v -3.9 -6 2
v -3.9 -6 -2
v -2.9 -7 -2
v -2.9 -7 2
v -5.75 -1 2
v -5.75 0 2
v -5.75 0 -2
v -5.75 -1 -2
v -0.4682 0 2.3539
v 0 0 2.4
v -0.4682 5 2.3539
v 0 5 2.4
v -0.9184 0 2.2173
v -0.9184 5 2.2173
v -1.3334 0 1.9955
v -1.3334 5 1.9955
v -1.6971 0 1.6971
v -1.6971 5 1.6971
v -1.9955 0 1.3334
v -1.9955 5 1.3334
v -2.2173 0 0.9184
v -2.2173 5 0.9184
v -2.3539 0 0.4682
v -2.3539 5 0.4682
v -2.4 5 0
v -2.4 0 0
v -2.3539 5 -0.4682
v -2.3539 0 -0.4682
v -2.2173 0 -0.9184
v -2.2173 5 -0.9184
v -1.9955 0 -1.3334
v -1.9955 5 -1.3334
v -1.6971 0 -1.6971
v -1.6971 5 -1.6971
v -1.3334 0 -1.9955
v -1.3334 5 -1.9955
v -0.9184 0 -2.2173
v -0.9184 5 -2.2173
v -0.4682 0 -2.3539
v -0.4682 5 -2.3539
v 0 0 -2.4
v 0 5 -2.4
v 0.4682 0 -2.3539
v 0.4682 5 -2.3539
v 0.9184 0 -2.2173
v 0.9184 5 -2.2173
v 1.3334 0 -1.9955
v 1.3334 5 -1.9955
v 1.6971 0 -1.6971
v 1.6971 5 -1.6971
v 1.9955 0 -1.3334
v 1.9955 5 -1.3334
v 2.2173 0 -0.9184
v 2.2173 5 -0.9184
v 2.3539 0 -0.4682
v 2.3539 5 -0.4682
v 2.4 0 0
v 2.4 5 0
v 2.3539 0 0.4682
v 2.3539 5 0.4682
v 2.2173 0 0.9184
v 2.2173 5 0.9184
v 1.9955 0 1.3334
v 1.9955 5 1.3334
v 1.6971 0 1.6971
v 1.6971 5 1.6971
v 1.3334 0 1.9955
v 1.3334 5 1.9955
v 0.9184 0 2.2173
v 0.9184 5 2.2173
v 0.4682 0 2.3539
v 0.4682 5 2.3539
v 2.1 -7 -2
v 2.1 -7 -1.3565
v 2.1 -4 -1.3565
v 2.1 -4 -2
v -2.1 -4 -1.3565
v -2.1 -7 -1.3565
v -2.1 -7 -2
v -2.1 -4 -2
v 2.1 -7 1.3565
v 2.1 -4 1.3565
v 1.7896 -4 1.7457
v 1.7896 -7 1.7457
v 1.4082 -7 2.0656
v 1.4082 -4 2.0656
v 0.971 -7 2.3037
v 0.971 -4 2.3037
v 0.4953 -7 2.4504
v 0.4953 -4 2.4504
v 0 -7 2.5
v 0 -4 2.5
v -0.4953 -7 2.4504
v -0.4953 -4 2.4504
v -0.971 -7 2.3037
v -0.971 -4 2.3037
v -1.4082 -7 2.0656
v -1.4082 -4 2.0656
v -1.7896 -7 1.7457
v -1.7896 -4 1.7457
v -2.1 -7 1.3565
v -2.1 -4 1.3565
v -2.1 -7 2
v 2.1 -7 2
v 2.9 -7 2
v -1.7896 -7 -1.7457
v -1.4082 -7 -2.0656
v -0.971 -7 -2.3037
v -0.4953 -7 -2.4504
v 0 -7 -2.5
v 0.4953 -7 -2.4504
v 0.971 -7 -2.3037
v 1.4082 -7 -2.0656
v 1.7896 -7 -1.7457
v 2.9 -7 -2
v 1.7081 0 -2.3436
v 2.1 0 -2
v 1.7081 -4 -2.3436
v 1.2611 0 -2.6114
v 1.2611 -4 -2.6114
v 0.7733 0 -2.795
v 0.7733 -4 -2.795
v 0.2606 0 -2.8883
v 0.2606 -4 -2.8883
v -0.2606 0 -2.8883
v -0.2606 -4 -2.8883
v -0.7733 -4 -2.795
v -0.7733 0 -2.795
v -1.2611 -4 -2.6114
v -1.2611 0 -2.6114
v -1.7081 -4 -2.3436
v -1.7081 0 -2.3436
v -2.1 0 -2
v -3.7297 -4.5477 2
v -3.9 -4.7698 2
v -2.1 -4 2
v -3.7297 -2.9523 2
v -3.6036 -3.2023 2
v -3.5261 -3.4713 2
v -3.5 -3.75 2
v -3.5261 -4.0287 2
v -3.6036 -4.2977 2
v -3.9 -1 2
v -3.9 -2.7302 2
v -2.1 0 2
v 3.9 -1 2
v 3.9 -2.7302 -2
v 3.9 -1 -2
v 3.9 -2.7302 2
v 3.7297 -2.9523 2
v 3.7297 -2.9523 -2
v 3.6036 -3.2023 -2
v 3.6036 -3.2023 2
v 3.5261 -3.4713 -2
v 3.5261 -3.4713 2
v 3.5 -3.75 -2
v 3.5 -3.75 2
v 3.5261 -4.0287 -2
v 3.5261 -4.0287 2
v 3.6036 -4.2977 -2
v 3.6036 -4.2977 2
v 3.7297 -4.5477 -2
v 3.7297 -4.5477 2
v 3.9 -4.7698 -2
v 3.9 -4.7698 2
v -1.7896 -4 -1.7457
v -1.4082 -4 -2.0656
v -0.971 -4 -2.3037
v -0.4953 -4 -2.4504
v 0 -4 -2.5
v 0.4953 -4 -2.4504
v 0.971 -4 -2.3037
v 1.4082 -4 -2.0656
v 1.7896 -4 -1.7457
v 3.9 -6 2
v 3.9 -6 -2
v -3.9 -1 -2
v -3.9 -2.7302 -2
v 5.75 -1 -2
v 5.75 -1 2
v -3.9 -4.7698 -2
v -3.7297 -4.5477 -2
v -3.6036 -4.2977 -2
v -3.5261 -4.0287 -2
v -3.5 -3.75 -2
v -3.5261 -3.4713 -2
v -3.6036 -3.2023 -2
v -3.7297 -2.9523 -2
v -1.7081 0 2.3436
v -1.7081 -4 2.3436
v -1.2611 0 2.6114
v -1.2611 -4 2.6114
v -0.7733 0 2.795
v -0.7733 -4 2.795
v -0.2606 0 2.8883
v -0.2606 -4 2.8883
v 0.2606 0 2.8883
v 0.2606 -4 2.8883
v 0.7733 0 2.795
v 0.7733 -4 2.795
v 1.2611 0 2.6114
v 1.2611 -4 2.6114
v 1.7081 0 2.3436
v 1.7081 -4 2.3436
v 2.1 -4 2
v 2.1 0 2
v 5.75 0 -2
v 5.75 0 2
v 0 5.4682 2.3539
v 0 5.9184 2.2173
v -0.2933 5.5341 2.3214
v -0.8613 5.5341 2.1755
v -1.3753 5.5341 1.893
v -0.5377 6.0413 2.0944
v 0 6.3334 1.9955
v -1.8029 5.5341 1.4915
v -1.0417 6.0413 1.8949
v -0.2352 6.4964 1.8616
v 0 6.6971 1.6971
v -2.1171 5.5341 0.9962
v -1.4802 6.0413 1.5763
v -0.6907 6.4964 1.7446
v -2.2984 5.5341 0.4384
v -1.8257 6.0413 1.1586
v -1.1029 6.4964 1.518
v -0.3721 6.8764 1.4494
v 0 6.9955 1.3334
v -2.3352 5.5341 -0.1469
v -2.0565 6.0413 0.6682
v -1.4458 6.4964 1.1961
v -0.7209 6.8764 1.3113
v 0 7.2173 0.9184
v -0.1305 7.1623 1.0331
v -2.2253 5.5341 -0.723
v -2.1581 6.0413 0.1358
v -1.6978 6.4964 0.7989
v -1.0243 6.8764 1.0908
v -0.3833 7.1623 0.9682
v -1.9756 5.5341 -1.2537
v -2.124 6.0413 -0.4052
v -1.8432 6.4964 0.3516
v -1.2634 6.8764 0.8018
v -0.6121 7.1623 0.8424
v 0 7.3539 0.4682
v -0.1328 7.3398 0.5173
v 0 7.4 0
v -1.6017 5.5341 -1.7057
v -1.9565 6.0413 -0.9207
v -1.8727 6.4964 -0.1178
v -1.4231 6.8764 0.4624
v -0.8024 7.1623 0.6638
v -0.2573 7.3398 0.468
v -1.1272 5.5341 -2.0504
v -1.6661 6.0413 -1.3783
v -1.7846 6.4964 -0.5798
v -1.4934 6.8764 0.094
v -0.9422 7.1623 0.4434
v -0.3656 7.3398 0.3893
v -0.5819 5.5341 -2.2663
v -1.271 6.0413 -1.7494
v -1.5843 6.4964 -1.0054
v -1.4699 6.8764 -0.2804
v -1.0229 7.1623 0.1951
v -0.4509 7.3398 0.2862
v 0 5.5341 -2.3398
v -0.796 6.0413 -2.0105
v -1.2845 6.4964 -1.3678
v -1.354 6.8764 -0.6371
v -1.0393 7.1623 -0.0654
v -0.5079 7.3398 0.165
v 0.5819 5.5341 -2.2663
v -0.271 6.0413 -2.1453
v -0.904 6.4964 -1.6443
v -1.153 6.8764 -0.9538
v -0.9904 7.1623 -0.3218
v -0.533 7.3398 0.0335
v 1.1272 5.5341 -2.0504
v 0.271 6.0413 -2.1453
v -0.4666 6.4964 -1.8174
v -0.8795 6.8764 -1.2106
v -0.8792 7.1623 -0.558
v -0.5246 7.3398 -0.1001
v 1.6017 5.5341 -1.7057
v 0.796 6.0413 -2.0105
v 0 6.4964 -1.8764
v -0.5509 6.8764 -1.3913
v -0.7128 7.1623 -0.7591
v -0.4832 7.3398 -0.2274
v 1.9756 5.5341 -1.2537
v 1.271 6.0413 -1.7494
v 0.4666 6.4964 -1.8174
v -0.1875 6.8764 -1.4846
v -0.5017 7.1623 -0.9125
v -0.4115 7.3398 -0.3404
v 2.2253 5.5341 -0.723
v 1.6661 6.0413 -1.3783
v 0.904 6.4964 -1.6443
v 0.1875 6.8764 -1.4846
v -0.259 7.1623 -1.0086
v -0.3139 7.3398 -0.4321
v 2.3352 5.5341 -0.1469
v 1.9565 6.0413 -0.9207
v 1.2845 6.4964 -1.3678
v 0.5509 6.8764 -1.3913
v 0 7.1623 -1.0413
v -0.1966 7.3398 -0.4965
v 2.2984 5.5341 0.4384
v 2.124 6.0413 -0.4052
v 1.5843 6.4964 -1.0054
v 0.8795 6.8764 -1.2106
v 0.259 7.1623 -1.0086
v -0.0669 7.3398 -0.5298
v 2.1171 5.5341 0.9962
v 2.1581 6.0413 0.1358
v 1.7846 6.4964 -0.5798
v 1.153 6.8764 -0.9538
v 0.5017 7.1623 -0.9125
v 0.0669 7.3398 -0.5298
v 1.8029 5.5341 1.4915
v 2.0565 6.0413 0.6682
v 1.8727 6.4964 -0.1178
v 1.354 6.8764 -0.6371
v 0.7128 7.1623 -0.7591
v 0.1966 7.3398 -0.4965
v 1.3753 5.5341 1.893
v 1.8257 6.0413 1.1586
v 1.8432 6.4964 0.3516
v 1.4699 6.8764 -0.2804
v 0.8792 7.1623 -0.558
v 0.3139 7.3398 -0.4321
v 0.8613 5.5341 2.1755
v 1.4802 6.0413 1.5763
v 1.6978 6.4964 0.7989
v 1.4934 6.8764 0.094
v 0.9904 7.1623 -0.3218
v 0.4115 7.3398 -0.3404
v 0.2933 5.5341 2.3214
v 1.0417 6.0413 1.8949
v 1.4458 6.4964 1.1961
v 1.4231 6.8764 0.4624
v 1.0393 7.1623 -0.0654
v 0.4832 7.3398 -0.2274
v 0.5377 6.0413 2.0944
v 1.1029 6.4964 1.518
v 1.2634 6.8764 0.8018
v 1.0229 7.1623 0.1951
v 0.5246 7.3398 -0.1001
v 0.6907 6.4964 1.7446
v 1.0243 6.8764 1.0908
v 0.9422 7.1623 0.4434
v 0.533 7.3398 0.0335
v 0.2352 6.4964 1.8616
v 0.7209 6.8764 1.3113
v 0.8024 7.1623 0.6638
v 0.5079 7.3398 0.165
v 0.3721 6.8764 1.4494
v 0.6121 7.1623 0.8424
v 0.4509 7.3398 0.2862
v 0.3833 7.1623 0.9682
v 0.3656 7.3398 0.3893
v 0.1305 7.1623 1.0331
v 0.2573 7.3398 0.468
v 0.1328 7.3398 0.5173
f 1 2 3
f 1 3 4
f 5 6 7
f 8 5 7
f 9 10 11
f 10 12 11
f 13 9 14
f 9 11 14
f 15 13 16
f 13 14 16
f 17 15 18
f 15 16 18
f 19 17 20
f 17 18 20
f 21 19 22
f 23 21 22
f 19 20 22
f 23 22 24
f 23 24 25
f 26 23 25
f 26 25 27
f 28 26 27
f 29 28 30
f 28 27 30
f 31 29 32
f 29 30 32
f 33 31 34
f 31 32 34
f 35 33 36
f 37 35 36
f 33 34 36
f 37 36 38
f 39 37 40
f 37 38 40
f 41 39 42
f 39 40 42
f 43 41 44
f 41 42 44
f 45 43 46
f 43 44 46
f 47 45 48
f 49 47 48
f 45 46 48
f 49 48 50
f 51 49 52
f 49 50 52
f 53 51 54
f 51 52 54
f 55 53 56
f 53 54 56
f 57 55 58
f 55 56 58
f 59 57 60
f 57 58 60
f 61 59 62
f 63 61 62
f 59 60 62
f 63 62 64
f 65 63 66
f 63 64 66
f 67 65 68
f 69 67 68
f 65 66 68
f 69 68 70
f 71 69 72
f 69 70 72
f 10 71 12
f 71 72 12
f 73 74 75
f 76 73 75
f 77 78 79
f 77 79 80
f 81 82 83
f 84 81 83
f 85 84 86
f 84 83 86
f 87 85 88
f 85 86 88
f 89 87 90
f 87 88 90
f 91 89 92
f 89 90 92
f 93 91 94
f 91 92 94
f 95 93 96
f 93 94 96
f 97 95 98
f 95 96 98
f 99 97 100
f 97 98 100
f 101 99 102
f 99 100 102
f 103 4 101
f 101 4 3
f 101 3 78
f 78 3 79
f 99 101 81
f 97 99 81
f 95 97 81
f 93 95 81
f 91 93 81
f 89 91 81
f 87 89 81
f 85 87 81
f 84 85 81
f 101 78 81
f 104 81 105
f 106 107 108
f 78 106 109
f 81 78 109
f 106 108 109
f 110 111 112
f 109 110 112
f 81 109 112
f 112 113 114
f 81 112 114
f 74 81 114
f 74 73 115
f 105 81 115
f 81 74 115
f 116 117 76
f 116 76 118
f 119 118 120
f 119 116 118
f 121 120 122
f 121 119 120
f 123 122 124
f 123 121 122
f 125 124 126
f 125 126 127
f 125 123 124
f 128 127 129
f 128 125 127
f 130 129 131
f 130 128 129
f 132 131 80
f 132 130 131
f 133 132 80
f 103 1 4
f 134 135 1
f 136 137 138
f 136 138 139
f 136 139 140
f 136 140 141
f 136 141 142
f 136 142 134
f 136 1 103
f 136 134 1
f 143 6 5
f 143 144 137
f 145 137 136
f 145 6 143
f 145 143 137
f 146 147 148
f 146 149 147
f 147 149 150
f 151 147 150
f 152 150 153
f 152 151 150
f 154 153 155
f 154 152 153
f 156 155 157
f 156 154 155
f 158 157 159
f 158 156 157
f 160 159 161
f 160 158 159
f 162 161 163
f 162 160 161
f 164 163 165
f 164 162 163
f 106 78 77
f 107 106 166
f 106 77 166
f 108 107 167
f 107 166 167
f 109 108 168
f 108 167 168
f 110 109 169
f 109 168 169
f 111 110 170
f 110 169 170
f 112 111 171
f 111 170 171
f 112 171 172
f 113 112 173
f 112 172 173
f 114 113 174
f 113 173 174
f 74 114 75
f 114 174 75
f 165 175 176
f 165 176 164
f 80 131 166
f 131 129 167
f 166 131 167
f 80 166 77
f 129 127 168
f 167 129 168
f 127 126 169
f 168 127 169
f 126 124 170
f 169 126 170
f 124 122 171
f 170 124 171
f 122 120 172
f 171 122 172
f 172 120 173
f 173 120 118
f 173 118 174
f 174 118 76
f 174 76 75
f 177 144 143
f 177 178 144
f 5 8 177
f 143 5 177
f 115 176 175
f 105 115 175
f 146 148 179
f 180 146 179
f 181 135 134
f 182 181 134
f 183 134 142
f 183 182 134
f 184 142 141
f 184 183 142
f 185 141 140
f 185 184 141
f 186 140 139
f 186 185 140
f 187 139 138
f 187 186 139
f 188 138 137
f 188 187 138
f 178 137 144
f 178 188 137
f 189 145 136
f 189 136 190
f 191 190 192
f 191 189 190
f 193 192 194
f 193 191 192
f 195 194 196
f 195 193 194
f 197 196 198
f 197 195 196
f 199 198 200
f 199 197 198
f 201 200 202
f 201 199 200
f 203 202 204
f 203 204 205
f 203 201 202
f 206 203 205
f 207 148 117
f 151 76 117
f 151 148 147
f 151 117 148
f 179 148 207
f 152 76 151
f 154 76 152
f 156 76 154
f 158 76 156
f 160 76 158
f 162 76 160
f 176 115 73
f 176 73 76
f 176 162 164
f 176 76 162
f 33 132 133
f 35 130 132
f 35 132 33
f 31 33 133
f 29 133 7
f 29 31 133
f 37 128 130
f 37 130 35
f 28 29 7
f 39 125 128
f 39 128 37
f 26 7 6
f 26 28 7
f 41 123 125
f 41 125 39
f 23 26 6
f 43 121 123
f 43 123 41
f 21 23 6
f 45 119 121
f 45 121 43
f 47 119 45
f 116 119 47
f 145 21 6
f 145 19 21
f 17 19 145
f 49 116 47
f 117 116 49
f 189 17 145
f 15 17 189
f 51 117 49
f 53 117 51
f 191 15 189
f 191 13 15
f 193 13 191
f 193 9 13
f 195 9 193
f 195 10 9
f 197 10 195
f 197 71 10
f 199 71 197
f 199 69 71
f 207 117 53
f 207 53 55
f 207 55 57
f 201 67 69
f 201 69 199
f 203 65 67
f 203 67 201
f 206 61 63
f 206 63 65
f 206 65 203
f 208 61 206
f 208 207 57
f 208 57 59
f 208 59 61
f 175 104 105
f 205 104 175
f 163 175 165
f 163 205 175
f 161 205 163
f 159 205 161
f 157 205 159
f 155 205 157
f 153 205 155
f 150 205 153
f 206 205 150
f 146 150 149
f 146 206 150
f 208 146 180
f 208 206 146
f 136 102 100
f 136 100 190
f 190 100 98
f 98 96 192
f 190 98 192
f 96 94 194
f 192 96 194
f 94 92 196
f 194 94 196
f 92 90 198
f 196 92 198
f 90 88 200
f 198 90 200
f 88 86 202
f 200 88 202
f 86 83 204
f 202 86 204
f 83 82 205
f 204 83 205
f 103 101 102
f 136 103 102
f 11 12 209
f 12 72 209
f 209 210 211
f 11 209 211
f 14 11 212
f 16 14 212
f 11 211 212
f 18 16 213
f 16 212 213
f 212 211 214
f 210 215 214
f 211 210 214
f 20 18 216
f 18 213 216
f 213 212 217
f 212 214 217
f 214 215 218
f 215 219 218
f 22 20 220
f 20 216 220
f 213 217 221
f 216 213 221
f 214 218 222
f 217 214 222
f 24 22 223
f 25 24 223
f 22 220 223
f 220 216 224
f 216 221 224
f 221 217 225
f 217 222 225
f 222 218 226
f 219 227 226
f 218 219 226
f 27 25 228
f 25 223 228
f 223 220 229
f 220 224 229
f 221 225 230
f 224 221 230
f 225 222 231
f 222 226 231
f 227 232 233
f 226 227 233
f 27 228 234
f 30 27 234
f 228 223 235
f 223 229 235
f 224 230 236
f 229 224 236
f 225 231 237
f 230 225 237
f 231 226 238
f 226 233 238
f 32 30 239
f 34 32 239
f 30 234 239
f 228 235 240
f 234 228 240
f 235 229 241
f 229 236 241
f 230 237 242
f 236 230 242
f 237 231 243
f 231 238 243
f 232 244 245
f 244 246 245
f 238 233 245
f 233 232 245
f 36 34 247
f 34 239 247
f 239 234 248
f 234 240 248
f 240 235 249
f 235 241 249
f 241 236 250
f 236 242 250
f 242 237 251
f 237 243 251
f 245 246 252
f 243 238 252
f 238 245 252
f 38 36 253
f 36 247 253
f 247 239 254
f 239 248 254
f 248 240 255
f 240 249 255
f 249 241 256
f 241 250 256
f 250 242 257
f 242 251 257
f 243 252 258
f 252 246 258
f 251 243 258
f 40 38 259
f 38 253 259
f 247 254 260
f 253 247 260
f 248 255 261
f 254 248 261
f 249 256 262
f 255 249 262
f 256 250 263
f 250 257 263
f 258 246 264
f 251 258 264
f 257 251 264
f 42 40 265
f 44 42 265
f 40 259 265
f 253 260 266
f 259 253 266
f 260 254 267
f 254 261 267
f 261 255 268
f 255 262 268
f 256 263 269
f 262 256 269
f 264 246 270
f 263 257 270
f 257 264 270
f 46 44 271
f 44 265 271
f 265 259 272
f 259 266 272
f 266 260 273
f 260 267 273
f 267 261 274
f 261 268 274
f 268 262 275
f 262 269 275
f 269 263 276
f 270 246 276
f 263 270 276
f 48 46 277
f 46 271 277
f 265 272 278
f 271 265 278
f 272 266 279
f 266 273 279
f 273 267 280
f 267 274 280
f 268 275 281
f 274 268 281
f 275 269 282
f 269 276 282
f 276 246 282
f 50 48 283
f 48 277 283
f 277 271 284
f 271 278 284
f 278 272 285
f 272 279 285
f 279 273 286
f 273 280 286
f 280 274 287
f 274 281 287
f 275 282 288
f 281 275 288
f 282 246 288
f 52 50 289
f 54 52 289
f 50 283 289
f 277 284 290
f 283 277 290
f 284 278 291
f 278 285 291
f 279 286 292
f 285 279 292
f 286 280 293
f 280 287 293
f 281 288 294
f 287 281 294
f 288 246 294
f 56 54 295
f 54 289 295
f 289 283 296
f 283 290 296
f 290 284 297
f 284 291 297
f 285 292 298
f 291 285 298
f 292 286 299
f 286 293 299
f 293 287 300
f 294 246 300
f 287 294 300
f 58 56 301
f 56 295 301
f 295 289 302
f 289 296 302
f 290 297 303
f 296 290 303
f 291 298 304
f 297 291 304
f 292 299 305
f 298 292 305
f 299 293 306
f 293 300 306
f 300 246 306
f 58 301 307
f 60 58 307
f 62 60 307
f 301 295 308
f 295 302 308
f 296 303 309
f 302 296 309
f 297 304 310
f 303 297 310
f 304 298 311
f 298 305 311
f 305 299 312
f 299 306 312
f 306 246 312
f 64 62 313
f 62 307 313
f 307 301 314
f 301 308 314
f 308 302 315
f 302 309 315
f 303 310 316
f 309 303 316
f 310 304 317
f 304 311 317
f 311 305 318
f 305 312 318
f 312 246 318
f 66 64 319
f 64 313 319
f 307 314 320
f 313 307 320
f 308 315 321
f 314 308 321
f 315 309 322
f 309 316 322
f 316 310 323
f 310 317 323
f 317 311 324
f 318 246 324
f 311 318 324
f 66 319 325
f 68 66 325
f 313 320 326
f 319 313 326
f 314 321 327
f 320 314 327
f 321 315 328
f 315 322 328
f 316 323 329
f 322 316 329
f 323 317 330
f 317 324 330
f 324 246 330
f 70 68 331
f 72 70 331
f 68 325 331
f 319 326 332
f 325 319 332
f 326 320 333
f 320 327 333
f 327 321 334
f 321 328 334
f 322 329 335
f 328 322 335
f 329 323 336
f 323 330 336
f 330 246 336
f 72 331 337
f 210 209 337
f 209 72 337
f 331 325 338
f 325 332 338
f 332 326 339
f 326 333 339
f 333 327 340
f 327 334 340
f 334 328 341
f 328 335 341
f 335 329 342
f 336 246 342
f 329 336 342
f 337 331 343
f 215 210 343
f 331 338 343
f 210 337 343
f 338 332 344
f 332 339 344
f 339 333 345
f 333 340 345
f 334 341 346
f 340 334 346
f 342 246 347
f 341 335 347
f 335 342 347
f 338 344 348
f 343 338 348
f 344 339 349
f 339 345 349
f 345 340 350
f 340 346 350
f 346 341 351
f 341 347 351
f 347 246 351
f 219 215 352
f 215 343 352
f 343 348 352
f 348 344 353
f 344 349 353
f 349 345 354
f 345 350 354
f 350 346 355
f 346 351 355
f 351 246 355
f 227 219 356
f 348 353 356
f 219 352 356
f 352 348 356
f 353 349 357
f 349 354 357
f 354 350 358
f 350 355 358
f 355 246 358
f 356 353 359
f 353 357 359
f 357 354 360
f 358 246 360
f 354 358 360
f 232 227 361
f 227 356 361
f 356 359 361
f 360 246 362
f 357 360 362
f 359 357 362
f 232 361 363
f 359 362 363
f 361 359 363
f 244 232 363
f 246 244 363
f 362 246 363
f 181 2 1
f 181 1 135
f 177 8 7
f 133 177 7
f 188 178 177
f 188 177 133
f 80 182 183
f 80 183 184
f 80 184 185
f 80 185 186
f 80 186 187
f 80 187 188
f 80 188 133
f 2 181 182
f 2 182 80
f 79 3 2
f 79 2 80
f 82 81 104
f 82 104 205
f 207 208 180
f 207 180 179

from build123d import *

# Parameters (mm, degrees)
SKETCH_1_W                  = 11.5
SKETCH_1_H                  = 4
EXTRUDE_1_DEPTH             = 1
SKETCH_2_R                  = 2.9
EXTRUDE_2_DEPTH             = 4
SKETCH_4_R                  = 2.5
EXTRUDE_3_DEPTH             = 3.6
EXTRUDE_4_REACH             = 11.962
SKETCH_5_W                  = 1.8
SKETCH_5_H                  = 6.6
EXTRUDE_4_DIRECTION_2_REACH = 11.962
CUT_EXTRUDE_1_DEPTH         = 10.961551084
CUT_EXTRUDE_1_DEPTH_BACK    = 10.961551084
SKETCH_6_R                  = 1.5
CUT_EXTRUDE_2_DEPTH         = 10.961551084
CUT_EXTRUDE_2_DEPTH_BACK    = 10.961551084
SKETCH_7_W                  = 7.8
SKETCH_7_H                  = 0.6
CHAMFER_1_SIZE              = 1


with BuildPart() as part:
    # 草图1 → 凸台-拉伸1 (new body)
    with BuildSketch(Plane(origin=(0, 0, 0), x_dir=(1, 0, 0), z_dir=(0, 1, 0))):
        Rectangle(SKETCH_1_W, SKETCH_1_H)
    extrude(amount=-EXTRUDE_1_DEPTH)

    # 草图2 → 凸台-拉伸2 (add)
    with BuildSketch(Plane(origin=(0, 0, 0), x_dir=(-1, 0, 0), z_dir=(0, 1, 0))):
        with Locations(Location((0, 0, 0), (0, 0, 90))):
            Circle(SKETCH_2_R)
    extrude(amount=-EXTRUDE_2_DEPTH)

    # 草图3 → 旋转1 (revolve)
    with BuildSketch(Plane.XY, mode=Mode.PRIVATE) as revolve_1_sk:
        with BuildLine():
            Line((0, 0), (2.4, 0))
            Line((2.4, 0), (2.4, 5))
            ThreePointArc((2.4, 5), (1.697056275, 6.697056275), (0, 7.4))
            Line((0, 7.4), (0, 0))
        make_face()
    revolve(revolve_1_sk.sketch.rotate(Axis((0, 7.945806113, 0), (0, -1, 0)), 90), axis=Axis((0, 7.945806113, 0), (0, -1, 0)))

    # 草图4 → 凸台-拉伸3 (add)
    with BuildSketch(Plane.XZ.offset(4)):
        with Locations(Location((0, 0, 0), (0, 0, 90))):
            Circle(SKETCH_4_R)
    extrude(amount=EXTRUDE_3_DEPTH)

    # 凸台-拉伸4: up to this face of the body (flat: up to its plane)
    extrude_4_end = Plane(part.part.faces().sort_by_distance((3.925, -0.5, -2))[0])
    # 草图5 → 凸台-拉伸4 (add, up to the picked face)
    with BuildSketch(Plane.XY, mode=Mode.PRIVATE) as extrude_4_sk1:
        with Locations((-3, -4.3)):
            Rectangle(SKETCH_5_W, SKETCH_5_H)
    extrude_4_tool1 = split(extrude(extrude_4_sk1.sketch, amount=-EXTRUDE_4_REACH, mode=Mode.PRIVATE), bisect_by=extrude_4_end, keep=Keep.BOTH, mode=Mode.PRIVATE)
    # 草图5 → 凸台-拉伸4 (add, up to the picked face)
    with BuildSketch(Plane.XY, mode=Mode.PRIVATE) as extrude_4_sk2:
        with Locations((3, -4.3)):
            Rectangle(SKETCH_5_W, SKETCH_5_H)
    extrude_4_tool2 = split(extrude(extrude_4_sk2.sketch, amount=-EXTRUDE_4_REACH, mode=Mode.PRIVATE), bisect_by=extrude_4_end, keep=Keep.BOTH, mode=Mode.PRIVATE)
    add(extrude_4_tool1.solids().sort_by(Axis((-3, -4.3, 0), (0, 0, -1)))[0])
    add(extrude_4_tool2.solids().sort_by(Axis((3, -4.3, 0), (0, 0, -1)))[0])

    # 凸台-拉伸4 direction 2: up to this face of the body (flat: up to its plane)
    extrude_4_direction_2_end = Plane(part.part.faces().sort_by_distance((3.925, -0.5, 2))[0])
    # 草图5 → 凸台-拉伸4 direction 2 (add, up to the picked face)
    with BuildSketch(Plane.XY, mode=Mode.PRIVATE) as extrude_4_direction_2_sk1:
        with Locations((-3, -4.3)):
            Rectangle(SKETCH_5_W, SKETCH_5_H)
    extrude_4_direction_2_tool1 = split(extrude(extrude_4_direction_2_sk1.sketch, amount=EXTRUDE_4_DIRECTION_2_REACH, mode=Mode.PRIVATE), bisect_by=extrude_4_direction_2_end, keep=Keep.BOTH, mode=Mode.PRIVATE)
    # 草图5 → 凸台-拉伸4 direction 2 (add, up to the picked face)
    with BuildSketch(Plane.XY, mode=Mode.PRIVATE) as extrude_4_direction_2_sk2:
        with Locations((3, -4.3)):
            Rectangle(SKETCH_5_W, SKETCH_5_H)
    extrude_4_direction_2_tool2 = split(extrude(extrude_4_direction_2_sk2.sketch, amount=EXTRUDE_4_DIRECTION_2_REACH, mode=Mode.PRIVATE), bisect_by=extrude_4_direction_2_end, keep=Keep.BOTH, mode=Mode.PRIVATE)
    add(extrude_4_direction_2_tool1.solids().sort_by(Axis((-3, -4.3, 0), (0, 0, 1)))[0])
    add(extrude_4_direction_2_tool2.solids().sort_by(Axis((3, -4.3, 0), (0, 0, 1)))[0])

    # 草图6 → 切除-拉伸1 (cut, two sides: drawn at the far end of the back side and taken through both)
    with BuildSketch(Plane.XY.offset(-CUT_EXTRUDE_1_DEPTH_BACK)):
        with Locations((-5, -3.75)):
            Circle(SKETCH_6_R)
        with Locations((5, -3.75)):
            Circle(SKETCH_6_R)
    extrude(amount=CUT_EXTRUDE_1_DEPTH + CUT_EXTRUDE_1_DEPTH_BACK, mode=Mode.SUBTRACT)

    # 草图7 → 切除-拉伸2 (cut, two sides: drawn at the far end of the back side and taken through both)
    with BuildSketch(Plane.XY.offset(-CUT_EXTRUDE_2_DEPTH_BACK)):
        with Locations((0, -7.3)):
            Rectangle(SKETCH_7_W, SKETCH_7_H)
    extrude(amount=CUT_EXTRUDE_2_DEPTH + CUT_EXTRUDE_2_DEPTH_BACK, mode=Mode.SUBTRACT)

    # 倒角1
    chamfer_1_edges = [part.edges().sort_by_distance(p)[0] for p in [
        (-3.9, -7, 0),
        (3.9, -7, 0),
    ]]
    chamfer(chamfer_1_edges, length=CHAMFER_1_SIZE)


solid = part.part
